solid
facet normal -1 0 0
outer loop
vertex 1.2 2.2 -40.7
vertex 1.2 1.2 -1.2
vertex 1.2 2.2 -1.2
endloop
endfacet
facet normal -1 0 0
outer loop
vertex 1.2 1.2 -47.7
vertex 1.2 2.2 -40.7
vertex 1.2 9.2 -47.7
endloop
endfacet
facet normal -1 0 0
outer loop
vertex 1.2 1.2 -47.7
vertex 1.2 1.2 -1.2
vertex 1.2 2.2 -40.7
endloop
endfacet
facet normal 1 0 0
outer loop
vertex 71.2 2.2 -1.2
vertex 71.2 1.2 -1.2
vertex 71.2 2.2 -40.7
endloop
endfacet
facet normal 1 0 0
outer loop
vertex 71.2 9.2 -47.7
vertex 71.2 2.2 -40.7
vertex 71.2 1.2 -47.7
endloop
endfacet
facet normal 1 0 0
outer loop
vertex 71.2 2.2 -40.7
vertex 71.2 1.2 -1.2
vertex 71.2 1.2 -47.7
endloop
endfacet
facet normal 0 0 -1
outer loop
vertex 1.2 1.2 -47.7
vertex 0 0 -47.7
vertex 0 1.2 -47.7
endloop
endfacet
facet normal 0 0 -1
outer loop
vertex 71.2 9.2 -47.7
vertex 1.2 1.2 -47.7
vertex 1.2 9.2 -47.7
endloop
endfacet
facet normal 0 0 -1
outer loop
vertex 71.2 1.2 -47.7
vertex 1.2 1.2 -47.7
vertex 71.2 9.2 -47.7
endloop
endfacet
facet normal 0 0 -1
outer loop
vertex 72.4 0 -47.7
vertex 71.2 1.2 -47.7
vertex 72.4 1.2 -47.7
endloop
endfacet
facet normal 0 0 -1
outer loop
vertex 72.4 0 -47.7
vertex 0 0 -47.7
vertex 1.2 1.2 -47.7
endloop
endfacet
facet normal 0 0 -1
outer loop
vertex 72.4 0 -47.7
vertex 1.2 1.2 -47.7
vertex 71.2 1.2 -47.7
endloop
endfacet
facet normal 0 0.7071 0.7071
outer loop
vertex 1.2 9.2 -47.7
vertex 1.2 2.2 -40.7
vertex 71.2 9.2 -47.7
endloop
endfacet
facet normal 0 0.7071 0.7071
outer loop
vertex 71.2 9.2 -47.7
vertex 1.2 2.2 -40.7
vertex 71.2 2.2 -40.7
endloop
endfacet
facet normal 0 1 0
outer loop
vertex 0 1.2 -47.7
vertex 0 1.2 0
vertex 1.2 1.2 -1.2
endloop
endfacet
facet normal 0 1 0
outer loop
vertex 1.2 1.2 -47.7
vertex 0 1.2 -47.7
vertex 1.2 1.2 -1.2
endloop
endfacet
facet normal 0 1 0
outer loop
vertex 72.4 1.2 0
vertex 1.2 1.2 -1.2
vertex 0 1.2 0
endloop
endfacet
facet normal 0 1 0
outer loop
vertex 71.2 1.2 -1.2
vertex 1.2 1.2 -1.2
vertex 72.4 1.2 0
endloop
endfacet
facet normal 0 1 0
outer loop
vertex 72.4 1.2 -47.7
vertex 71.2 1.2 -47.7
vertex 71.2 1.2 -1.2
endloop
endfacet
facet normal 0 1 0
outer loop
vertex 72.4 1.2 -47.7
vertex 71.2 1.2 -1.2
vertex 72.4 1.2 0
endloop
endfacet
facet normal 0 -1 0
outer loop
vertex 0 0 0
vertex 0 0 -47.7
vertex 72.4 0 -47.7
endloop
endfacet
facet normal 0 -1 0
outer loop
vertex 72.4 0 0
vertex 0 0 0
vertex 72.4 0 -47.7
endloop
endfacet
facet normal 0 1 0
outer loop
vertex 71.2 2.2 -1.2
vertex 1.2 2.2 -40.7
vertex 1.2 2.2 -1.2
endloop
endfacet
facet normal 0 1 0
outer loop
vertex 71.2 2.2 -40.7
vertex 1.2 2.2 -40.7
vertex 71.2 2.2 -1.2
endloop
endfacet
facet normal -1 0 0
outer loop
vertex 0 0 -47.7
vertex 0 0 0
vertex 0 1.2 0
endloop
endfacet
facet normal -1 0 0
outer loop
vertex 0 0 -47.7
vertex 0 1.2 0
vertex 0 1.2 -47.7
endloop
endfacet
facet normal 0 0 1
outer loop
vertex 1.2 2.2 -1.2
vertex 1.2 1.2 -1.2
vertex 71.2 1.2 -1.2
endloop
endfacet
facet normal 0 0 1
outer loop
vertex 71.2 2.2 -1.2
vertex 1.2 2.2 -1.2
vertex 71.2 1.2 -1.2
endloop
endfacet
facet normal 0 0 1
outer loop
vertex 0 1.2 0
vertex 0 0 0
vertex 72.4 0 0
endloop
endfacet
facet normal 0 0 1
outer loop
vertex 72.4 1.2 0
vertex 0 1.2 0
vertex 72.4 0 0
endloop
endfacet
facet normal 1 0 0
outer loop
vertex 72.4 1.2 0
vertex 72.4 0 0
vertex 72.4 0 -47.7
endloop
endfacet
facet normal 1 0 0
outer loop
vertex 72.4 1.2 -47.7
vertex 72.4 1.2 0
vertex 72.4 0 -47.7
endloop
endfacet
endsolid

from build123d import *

# Parameters (mm, degrees)
SKICA2_W                = 72.4
SKICA2_H                = 47.7
P_IDAT_VYSUNUT_M1_DEPTH = 1.2
SKICA3_W                = 70
SKICA3_H                = 46.5
P_IDAT_VYSUNUT_M2_DEPTH = 1
SKICA4_W                = 70
SKICA4_H                = 7
P_IDAT_VYSUNUT_M3_DEPTH = 7
ZKOSEN_2_SIZE           = 7


with BuildPart() as part:
    # Skica2 → Přidat vysunutím1 (new body)
    with BuildSketch(Plane(origin=(0, 0, 0), x_dir=(1, 0, 0), z_dir=(0, 1, 0))):
        with Locations((36.2, 23.85)):
            Rectangle(SKICA2_W, SKICA2_H)
    extrude(amount=P_IDAT_VYSUNUT_M1_DEPTH)

    # Skica3 → Přidat vysunutím2 (add)
    with BuildSketch(Plane(origin=(0, 1.2, 0), x_dir=(1, 0, 0), z_dir=(0, 1, 0))):
        with Locations((36.2, 24.45)):
            Rectangle(SKICA3_W, SKICA3_H)
    extrude(amount=P_IDAT_VYSUNUT_M2_DEPTH)

    # Skica4 → Přidat vysunutím3 (add)
    with BuildSketch(Plane(origin=(0, 2.2, 0), x_dir=(1, 0, 0), z_dir=(0, 1, 0))):
        with Locations((36.2, 44.2)):
            Rectangle(SKICA4_W, SKICA4_H)
    extrude(amount=P_IDAT_VYSUNUT_M3_DEPTH)

    # Zkosení2
    zkosen_2_edges = [part.edges().sort_by_distance(p)[0] for p in [
        (36.2, 9.2, -40.7),
    ]]
    chamfer(zkosen_2_edges, length=ZKOSEN_2_SIZE - 0.0001)  # a hair under: the kernel refuses the full size


solid = part.part
